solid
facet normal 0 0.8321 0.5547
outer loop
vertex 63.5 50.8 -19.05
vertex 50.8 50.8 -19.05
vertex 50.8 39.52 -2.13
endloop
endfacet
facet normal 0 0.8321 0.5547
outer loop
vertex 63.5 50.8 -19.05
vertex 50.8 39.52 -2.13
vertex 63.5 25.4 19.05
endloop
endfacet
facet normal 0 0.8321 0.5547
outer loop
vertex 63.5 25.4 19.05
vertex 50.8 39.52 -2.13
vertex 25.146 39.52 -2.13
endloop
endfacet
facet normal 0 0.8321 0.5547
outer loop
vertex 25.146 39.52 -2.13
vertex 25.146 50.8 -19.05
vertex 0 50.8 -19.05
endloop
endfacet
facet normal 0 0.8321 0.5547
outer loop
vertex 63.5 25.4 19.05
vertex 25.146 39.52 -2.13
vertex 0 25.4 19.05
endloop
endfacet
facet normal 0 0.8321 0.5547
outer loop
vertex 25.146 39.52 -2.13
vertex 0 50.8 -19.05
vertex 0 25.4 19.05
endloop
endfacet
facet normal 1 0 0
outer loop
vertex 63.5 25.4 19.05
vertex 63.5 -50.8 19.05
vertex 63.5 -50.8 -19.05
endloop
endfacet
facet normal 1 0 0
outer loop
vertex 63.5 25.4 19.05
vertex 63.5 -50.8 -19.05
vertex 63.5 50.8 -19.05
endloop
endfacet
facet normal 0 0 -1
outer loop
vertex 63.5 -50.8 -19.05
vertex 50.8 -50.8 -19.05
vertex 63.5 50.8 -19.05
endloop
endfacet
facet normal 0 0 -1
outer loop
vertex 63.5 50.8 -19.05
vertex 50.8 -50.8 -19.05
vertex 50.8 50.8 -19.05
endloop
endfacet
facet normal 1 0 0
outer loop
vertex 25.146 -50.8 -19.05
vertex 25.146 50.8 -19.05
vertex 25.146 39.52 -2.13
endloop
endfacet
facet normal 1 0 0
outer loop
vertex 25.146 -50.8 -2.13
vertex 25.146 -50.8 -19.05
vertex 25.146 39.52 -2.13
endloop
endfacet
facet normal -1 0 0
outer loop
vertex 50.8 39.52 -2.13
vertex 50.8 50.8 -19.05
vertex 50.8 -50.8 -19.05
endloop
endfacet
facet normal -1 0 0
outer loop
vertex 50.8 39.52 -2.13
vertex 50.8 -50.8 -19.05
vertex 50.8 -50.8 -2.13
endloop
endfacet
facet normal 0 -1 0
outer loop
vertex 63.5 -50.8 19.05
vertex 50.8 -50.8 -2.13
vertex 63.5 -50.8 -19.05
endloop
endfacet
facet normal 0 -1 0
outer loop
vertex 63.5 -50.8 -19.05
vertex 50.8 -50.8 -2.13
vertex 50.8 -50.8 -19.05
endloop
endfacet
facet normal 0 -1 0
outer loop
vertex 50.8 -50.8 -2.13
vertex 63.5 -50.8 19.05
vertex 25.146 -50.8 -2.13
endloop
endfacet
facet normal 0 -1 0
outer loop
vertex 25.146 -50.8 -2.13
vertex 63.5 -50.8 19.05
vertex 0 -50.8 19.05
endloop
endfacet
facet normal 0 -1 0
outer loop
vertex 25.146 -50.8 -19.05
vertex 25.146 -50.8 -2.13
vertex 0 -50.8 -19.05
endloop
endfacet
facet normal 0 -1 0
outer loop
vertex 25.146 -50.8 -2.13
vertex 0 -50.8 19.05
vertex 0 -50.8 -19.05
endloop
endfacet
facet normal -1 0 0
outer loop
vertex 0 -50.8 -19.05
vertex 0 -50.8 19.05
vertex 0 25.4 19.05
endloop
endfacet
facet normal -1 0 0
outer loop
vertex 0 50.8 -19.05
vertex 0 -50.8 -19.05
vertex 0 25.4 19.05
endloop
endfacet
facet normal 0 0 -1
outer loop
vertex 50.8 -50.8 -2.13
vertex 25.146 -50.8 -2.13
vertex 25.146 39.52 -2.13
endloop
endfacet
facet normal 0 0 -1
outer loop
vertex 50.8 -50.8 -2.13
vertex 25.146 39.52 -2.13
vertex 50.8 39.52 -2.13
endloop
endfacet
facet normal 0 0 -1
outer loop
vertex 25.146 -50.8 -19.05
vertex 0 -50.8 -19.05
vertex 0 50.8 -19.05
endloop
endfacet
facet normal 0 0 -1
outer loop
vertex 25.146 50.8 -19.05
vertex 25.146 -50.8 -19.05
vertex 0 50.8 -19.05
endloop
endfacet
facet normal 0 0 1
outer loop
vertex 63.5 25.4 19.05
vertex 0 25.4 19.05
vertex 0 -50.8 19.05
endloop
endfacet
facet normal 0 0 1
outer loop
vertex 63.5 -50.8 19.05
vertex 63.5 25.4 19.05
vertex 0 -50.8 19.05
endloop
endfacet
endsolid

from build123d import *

# Parameters (mm, degrees)
F1_DEPTH      = 63.5
F2_W          = 25.654
F2_H          = 16.9195546743
F3_DEPTH      = 50.801
F3_DEPTH_BACK = 50.801


with BuildPart() as f1:
    # F0 (on Right) → F1 (new body)
    with BuildSketch(Plane.YZ):
        Polygon((25.4, 19.05), (-50.8, 19.05), (-50.8, -19.05), (50.8, -19.05), align=None)
    extrude(amount=F1_DEPTH)

    # F2 (on Front) → F3 (cut, two sides)
    with BuildSketch(Plane.XZ) as f3_sk:
        with Locations((37.973, -10.5902226629)):
            Rectangle(F2_W, F2_H)
    extrude(amount=-F3_DEPTH, mode=Mode.SUBTRACT)
    extrude(f3_sk.sketch, amount=F3_DEPTH_BACK, mode=Mode.SUBTRACT)


solid = f1.part
